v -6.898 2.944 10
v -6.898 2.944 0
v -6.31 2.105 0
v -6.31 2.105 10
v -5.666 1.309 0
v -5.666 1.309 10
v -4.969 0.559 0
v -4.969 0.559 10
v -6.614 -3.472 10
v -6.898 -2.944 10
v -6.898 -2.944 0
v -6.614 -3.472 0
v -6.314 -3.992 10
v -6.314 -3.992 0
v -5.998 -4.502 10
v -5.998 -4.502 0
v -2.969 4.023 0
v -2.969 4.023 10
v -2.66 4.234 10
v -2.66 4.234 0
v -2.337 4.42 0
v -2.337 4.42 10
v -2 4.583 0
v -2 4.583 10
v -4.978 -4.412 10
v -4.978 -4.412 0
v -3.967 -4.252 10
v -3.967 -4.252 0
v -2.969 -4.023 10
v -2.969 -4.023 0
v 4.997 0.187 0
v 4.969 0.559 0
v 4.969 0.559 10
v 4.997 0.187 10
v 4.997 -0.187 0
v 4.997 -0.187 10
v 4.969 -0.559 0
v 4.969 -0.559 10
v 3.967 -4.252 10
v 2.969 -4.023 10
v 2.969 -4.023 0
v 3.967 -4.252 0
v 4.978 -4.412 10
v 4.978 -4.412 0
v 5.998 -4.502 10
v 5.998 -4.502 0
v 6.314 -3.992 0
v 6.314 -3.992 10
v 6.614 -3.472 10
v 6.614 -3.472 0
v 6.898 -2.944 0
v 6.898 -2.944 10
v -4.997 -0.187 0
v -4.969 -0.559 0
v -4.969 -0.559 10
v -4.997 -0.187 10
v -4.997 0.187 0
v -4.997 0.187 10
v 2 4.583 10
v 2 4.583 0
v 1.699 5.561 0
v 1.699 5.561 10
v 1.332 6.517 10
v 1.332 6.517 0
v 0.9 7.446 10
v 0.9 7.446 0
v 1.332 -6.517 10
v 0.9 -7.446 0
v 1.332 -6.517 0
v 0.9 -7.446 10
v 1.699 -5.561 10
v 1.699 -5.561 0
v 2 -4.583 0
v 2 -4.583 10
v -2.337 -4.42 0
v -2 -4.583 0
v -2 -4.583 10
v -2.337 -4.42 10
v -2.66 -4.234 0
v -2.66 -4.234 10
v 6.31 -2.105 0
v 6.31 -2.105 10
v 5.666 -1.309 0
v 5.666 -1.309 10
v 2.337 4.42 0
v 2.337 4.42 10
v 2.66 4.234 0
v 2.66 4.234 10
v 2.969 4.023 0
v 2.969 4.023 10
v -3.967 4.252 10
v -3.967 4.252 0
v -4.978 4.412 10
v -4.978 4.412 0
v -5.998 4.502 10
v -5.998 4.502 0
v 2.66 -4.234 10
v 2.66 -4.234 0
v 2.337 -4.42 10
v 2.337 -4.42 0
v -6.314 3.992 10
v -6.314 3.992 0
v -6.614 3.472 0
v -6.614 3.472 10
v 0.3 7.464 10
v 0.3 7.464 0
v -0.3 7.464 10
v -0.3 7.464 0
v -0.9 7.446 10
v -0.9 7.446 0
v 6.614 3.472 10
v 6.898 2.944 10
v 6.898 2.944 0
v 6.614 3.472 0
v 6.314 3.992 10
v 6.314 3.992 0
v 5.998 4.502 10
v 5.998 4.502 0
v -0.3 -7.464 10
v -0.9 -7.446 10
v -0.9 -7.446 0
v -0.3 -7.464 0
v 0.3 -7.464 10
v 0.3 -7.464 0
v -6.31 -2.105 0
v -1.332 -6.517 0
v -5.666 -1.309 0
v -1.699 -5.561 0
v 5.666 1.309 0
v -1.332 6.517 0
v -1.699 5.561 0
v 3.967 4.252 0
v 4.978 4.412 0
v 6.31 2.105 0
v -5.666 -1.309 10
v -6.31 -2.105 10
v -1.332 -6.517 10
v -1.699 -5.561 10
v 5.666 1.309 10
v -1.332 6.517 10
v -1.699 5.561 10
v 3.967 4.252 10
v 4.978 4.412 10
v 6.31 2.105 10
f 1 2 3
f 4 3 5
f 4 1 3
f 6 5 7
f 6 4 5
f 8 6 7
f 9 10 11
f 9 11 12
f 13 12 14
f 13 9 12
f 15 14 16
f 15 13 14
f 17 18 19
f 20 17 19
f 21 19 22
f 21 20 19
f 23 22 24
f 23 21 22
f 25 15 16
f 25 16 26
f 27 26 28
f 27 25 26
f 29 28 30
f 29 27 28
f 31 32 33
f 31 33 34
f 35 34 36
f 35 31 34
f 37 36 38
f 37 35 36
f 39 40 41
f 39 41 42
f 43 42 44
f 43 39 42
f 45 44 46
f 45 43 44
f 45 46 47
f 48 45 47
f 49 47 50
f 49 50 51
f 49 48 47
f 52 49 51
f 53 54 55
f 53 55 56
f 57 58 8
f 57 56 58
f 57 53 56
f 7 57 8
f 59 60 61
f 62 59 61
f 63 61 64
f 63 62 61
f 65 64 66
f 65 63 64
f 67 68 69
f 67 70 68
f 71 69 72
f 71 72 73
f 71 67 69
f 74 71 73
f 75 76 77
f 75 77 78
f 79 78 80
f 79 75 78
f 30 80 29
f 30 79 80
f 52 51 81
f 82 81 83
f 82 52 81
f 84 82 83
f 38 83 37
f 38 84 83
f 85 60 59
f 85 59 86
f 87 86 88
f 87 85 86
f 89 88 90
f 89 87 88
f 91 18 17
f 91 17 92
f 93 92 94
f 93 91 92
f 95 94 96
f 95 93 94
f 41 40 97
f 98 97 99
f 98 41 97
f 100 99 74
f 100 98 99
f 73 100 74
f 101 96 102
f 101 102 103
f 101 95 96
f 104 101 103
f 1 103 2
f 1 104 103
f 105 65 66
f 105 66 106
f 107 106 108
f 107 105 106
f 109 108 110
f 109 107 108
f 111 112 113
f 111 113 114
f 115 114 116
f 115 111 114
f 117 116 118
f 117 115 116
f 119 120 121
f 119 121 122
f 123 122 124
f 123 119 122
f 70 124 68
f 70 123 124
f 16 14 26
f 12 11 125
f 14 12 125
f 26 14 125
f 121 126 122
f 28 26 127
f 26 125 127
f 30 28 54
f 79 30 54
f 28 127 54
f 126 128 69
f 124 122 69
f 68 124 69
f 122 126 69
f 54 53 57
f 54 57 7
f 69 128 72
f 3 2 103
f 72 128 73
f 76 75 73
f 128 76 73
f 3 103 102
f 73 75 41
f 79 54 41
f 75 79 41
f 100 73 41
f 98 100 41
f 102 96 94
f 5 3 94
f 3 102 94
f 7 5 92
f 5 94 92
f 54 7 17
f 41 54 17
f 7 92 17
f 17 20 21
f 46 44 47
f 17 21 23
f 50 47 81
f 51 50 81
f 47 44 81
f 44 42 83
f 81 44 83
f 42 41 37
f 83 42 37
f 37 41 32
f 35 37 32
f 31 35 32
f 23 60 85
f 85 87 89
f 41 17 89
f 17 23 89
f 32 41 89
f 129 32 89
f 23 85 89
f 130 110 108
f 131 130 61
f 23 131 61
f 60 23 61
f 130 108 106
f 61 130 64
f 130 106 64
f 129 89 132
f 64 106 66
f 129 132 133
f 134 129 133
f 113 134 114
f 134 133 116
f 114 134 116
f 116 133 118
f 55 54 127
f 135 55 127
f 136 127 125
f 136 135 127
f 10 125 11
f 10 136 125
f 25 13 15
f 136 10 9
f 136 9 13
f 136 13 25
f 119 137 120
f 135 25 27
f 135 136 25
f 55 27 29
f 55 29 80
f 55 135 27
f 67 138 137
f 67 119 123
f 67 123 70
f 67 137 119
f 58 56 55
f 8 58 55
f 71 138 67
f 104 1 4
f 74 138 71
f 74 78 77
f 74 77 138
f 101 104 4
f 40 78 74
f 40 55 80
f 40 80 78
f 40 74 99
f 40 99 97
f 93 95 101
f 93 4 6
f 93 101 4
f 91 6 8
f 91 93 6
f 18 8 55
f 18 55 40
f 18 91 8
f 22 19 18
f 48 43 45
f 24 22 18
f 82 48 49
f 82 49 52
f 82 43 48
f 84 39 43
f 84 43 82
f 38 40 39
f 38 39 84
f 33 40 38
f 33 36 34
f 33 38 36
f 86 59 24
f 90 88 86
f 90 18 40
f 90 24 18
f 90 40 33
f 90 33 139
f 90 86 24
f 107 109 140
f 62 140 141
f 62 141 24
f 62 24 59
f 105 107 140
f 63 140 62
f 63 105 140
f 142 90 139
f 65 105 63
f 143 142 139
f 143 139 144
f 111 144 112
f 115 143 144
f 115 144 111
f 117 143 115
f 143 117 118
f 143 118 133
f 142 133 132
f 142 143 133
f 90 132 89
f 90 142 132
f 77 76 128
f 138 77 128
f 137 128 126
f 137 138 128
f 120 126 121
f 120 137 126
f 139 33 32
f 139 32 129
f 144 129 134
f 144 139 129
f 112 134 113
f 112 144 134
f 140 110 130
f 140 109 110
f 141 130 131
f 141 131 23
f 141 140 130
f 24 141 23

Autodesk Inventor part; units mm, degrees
ref_plane "YZ Plane" through (0, 0, 0) normal (1, 0, 0) x (0, 1, 0)
ref_plane "XZ Plane" through (0, 0, 0) normal (0, 1, 0) x (-1, 0, 0)
ref_plane "XY Plane" through (0, 0, 0) normal (0, 0, 1) x (1, 0, 0)
sketch "Sketch1" plane through (0, 0, 0) normal (0, 0, 1) x (1, 0, 0)
  circle A0 centre (0, 0) radius 5
  dimension "d0" = 10
extrude "Extrusion1" add sketch "Sketch1" along normal blind 10
sketch "Sketch3" plane through (0, 0, 10) normal (0, 0, 1) x (1, 0, 0)
  circle A0 centre (0, 0) radius 5 construction
  arc A1 (-2, -4.5826) -> (-0.9, -7.4458) centre (12.4788, -0.663) ccw
  arc A2 (0.9, -7.4458) -> (2, -4.5826) centre (-12.4788, -0.663) ccw
  arc A3 (-2, -4.5826) -> (2, -4.5826) centre (0, 0) ccw
  arc A4 (-0.9, -7.4458) -> (0.9, -7.4458) centre (0, 12.5339) ccw
  circle A5 centre (0, 0) radius 7.5 construction
  line L0 (0, 0) -> (0, -8.6797) construction
  arc A6 (2.9686, -4.0233) -> (5.9983, -4.5023) centre (6.8136, 10.4755) ccw
  arc A7 (2.9686, -4.0233) -> (4.9686, -0.5592) centre (0, 0) ccw
  arc A8 (6.8983, -2.9435) -> (4.9686, -0.5592) centre (-5.6653, -11.1385) ccw
  arc A9 (5.9983, -4.5023) -> (6.8983, -2.9435) centre (-10.8547, 6.267) ccw
  arc A10 (4.9686, 0.5592) -> (6.8983, 2.9435) centre (-5.6653, 11.1385) ccw
  arc A11 (4.9686, 0.5592) -> (2.9686, 4.0233) centre (0, 0) ccw
  arc A12 (5.9983, 4.5023) -> (2.9686, 4.0233) centre (6.8136, -10.4755) ccw
  arc A13 (6.8983, 2.9435) -> (5.9983, 4.5023) centre (-10.8547, -6.267) ccw
  arc A14 (2, 4.5826) -> (0.9, 7.4458) centre (-12.4788, 0.663) ccw
  arc A15 (2, 4.5826) -> (-2, 4.5826) centre (0, 0) ccw
  arc A16 (-0.9, 7.4458) -> (-2, 4.5826) centre (12.4788, 0.663) ccw
  arc A17 (0.9, 7.4458) -> (-0.9, 7.4458) centre (0, -12.5339) ccw
  arc A18 (-2.9686, 4.0233) -> (-5.9983, 4.5023) centre (-6.8136, -10.4755) ccw
  arc A19 (-2.9686, 4.0233) -> (-4.9686, 0.5592) centre (0, 0) ccw
  arc A20 (-6.8983, 2.9435) -> (-4.9686, 0.5592) centre (5.6653, 11.1385) ccw
  arc A21 (-5.9983, 4.5023) -> (-6.8983, 2.9435) centre (10.8547, -6.267) ccw
  arc A22 (-4.9686, -0.5592) -> (-6.8983, -2.9435) centre (5.6653, -11.1385) ccw
  arc A23 (-4.9686, -0.5592) -> (-2.9686, -4.0233) centre (0, 0) ccw
  arc A24 (-5.9983, -4.5023) -> (-2.9686, -4.0233) centre (-6.8136, 10.4755) ccw
  arc A25 (-6.8983, -2.9435) -> (-5.9983, -4.5023) centre (10.8547, 6.267) ccw
  point P0 (0, -7.4661)
  point P1 (0, -5)
  point P2 (4.3301, -2.5)
  point P3 (6.4658, -3.733)
  point P4 (4.3301, 2.5)
  point P5 (6.4658, 3.733)
  point P6 (0, 5)
  point P7 (0, 7.4661)
  point P8 (-4.3301, 2.5)
  point P9 (-6.4658, 3.733)
  point P10 (-4.3301, -2.5)
  point P11 (-6.4658, -3.733)
  dimension "d12" = 15
  dimension "d13" = 15
  dimension "d14" = 1.8
  dimension "d15" = 4
  dimension "d16" = 20
  dimension "d17" = 15
  dimension "d20" = 360
extrude "Extrusion2" add sketch "Sketch3" against normal blind 10
properties part number "SJ012" material "ABS Plastic"
